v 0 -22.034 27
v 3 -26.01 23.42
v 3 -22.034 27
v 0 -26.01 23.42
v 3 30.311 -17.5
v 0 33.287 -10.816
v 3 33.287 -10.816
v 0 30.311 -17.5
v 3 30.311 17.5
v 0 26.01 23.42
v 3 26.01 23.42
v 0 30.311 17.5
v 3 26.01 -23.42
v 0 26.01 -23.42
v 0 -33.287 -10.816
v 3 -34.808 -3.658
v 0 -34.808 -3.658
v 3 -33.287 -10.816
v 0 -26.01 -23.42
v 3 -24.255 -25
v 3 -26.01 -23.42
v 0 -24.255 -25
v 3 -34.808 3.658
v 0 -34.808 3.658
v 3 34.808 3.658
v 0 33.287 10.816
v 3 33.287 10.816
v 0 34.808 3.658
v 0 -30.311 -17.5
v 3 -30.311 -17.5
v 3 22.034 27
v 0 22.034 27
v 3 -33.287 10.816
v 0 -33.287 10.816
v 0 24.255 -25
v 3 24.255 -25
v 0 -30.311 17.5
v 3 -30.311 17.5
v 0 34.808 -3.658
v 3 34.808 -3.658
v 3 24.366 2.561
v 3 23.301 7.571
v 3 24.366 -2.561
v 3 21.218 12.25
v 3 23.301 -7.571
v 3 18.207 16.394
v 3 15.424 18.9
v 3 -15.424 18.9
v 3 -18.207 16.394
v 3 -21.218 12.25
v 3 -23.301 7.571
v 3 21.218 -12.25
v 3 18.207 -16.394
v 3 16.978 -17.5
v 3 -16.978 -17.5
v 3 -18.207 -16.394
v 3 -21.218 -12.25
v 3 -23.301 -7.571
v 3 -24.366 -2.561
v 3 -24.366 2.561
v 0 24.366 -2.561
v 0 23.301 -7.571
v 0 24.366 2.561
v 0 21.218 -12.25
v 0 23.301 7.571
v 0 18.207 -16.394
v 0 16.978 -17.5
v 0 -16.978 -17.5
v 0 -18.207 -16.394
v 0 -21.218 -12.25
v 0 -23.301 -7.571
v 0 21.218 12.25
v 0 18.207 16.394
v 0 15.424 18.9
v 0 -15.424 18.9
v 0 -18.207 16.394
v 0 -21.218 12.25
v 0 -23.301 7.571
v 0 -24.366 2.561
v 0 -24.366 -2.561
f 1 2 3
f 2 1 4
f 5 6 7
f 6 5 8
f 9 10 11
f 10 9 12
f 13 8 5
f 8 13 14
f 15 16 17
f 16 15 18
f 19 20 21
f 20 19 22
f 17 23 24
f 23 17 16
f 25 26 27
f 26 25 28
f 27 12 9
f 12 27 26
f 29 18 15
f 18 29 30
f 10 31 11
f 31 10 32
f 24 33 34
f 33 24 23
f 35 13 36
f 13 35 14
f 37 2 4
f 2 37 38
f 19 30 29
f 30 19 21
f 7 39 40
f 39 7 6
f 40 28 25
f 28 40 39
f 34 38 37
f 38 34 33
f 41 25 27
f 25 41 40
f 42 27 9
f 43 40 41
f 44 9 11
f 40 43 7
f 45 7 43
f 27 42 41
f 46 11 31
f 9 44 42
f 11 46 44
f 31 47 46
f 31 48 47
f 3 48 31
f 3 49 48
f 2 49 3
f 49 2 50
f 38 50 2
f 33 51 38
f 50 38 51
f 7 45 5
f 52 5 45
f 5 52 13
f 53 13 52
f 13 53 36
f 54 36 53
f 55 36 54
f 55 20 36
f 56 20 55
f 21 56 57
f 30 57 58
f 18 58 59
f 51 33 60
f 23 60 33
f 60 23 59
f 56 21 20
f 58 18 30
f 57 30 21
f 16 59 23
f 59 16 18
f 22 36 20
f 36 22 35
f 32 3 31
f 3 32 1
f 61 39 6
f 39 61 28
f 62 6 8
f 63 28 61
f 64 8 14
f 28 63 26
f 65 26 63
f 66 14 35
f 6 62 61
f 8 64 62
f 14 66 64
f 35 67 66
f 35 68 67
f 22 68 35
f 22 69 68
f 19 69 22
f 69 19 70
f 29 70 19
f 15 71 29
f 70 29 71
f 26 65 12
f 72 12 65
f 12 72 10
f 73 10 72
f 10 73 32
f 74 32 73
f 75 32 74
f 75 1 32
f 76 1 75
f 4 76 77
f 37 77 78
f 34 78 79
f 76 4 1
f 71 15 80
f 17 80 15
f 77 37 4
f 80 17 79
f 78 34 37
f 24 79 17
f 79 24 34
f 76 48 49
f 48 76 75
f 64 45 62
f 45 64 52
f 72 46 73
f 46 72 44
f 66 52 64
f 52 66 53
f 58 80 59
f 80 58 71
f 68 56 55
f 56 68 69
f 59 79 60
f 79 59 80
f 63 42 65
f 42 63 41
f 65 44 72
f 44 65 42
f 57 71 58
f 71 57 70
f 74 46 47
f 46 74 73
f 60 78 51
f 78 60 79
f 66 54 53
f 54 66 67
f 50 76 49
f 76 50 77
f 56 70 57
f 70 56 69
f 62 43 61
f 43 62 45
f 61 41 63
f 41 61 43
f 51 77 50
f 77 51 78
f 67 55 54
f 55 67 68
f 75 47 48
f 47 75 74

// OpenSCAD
module body_rib_solid(height){
difference(){
  translate([0,-35,-35])cube([height,70,70]);
  union(){
    difference(){
      translate([-1,0,0]) rotate([0,90,0]) cylinder(r=100,h=height+2);
      translate([-1,0,0]) rotate([0,90,0]) cylinder(r=35,h=height+2);
    }
    // Down plane
    translate([-1,-25,-35])cube([height+1,50,10]);
    // Upper plane
    translate([-1,-25,27])cube([height+1,50,30]);
  }
}
}


module body_rib(height){
  difference(){
    body_rib_solid(height);
    scale([1.1,0.7,0.7]) body_rib_solid(height);
  }
}


body_rib(3);
